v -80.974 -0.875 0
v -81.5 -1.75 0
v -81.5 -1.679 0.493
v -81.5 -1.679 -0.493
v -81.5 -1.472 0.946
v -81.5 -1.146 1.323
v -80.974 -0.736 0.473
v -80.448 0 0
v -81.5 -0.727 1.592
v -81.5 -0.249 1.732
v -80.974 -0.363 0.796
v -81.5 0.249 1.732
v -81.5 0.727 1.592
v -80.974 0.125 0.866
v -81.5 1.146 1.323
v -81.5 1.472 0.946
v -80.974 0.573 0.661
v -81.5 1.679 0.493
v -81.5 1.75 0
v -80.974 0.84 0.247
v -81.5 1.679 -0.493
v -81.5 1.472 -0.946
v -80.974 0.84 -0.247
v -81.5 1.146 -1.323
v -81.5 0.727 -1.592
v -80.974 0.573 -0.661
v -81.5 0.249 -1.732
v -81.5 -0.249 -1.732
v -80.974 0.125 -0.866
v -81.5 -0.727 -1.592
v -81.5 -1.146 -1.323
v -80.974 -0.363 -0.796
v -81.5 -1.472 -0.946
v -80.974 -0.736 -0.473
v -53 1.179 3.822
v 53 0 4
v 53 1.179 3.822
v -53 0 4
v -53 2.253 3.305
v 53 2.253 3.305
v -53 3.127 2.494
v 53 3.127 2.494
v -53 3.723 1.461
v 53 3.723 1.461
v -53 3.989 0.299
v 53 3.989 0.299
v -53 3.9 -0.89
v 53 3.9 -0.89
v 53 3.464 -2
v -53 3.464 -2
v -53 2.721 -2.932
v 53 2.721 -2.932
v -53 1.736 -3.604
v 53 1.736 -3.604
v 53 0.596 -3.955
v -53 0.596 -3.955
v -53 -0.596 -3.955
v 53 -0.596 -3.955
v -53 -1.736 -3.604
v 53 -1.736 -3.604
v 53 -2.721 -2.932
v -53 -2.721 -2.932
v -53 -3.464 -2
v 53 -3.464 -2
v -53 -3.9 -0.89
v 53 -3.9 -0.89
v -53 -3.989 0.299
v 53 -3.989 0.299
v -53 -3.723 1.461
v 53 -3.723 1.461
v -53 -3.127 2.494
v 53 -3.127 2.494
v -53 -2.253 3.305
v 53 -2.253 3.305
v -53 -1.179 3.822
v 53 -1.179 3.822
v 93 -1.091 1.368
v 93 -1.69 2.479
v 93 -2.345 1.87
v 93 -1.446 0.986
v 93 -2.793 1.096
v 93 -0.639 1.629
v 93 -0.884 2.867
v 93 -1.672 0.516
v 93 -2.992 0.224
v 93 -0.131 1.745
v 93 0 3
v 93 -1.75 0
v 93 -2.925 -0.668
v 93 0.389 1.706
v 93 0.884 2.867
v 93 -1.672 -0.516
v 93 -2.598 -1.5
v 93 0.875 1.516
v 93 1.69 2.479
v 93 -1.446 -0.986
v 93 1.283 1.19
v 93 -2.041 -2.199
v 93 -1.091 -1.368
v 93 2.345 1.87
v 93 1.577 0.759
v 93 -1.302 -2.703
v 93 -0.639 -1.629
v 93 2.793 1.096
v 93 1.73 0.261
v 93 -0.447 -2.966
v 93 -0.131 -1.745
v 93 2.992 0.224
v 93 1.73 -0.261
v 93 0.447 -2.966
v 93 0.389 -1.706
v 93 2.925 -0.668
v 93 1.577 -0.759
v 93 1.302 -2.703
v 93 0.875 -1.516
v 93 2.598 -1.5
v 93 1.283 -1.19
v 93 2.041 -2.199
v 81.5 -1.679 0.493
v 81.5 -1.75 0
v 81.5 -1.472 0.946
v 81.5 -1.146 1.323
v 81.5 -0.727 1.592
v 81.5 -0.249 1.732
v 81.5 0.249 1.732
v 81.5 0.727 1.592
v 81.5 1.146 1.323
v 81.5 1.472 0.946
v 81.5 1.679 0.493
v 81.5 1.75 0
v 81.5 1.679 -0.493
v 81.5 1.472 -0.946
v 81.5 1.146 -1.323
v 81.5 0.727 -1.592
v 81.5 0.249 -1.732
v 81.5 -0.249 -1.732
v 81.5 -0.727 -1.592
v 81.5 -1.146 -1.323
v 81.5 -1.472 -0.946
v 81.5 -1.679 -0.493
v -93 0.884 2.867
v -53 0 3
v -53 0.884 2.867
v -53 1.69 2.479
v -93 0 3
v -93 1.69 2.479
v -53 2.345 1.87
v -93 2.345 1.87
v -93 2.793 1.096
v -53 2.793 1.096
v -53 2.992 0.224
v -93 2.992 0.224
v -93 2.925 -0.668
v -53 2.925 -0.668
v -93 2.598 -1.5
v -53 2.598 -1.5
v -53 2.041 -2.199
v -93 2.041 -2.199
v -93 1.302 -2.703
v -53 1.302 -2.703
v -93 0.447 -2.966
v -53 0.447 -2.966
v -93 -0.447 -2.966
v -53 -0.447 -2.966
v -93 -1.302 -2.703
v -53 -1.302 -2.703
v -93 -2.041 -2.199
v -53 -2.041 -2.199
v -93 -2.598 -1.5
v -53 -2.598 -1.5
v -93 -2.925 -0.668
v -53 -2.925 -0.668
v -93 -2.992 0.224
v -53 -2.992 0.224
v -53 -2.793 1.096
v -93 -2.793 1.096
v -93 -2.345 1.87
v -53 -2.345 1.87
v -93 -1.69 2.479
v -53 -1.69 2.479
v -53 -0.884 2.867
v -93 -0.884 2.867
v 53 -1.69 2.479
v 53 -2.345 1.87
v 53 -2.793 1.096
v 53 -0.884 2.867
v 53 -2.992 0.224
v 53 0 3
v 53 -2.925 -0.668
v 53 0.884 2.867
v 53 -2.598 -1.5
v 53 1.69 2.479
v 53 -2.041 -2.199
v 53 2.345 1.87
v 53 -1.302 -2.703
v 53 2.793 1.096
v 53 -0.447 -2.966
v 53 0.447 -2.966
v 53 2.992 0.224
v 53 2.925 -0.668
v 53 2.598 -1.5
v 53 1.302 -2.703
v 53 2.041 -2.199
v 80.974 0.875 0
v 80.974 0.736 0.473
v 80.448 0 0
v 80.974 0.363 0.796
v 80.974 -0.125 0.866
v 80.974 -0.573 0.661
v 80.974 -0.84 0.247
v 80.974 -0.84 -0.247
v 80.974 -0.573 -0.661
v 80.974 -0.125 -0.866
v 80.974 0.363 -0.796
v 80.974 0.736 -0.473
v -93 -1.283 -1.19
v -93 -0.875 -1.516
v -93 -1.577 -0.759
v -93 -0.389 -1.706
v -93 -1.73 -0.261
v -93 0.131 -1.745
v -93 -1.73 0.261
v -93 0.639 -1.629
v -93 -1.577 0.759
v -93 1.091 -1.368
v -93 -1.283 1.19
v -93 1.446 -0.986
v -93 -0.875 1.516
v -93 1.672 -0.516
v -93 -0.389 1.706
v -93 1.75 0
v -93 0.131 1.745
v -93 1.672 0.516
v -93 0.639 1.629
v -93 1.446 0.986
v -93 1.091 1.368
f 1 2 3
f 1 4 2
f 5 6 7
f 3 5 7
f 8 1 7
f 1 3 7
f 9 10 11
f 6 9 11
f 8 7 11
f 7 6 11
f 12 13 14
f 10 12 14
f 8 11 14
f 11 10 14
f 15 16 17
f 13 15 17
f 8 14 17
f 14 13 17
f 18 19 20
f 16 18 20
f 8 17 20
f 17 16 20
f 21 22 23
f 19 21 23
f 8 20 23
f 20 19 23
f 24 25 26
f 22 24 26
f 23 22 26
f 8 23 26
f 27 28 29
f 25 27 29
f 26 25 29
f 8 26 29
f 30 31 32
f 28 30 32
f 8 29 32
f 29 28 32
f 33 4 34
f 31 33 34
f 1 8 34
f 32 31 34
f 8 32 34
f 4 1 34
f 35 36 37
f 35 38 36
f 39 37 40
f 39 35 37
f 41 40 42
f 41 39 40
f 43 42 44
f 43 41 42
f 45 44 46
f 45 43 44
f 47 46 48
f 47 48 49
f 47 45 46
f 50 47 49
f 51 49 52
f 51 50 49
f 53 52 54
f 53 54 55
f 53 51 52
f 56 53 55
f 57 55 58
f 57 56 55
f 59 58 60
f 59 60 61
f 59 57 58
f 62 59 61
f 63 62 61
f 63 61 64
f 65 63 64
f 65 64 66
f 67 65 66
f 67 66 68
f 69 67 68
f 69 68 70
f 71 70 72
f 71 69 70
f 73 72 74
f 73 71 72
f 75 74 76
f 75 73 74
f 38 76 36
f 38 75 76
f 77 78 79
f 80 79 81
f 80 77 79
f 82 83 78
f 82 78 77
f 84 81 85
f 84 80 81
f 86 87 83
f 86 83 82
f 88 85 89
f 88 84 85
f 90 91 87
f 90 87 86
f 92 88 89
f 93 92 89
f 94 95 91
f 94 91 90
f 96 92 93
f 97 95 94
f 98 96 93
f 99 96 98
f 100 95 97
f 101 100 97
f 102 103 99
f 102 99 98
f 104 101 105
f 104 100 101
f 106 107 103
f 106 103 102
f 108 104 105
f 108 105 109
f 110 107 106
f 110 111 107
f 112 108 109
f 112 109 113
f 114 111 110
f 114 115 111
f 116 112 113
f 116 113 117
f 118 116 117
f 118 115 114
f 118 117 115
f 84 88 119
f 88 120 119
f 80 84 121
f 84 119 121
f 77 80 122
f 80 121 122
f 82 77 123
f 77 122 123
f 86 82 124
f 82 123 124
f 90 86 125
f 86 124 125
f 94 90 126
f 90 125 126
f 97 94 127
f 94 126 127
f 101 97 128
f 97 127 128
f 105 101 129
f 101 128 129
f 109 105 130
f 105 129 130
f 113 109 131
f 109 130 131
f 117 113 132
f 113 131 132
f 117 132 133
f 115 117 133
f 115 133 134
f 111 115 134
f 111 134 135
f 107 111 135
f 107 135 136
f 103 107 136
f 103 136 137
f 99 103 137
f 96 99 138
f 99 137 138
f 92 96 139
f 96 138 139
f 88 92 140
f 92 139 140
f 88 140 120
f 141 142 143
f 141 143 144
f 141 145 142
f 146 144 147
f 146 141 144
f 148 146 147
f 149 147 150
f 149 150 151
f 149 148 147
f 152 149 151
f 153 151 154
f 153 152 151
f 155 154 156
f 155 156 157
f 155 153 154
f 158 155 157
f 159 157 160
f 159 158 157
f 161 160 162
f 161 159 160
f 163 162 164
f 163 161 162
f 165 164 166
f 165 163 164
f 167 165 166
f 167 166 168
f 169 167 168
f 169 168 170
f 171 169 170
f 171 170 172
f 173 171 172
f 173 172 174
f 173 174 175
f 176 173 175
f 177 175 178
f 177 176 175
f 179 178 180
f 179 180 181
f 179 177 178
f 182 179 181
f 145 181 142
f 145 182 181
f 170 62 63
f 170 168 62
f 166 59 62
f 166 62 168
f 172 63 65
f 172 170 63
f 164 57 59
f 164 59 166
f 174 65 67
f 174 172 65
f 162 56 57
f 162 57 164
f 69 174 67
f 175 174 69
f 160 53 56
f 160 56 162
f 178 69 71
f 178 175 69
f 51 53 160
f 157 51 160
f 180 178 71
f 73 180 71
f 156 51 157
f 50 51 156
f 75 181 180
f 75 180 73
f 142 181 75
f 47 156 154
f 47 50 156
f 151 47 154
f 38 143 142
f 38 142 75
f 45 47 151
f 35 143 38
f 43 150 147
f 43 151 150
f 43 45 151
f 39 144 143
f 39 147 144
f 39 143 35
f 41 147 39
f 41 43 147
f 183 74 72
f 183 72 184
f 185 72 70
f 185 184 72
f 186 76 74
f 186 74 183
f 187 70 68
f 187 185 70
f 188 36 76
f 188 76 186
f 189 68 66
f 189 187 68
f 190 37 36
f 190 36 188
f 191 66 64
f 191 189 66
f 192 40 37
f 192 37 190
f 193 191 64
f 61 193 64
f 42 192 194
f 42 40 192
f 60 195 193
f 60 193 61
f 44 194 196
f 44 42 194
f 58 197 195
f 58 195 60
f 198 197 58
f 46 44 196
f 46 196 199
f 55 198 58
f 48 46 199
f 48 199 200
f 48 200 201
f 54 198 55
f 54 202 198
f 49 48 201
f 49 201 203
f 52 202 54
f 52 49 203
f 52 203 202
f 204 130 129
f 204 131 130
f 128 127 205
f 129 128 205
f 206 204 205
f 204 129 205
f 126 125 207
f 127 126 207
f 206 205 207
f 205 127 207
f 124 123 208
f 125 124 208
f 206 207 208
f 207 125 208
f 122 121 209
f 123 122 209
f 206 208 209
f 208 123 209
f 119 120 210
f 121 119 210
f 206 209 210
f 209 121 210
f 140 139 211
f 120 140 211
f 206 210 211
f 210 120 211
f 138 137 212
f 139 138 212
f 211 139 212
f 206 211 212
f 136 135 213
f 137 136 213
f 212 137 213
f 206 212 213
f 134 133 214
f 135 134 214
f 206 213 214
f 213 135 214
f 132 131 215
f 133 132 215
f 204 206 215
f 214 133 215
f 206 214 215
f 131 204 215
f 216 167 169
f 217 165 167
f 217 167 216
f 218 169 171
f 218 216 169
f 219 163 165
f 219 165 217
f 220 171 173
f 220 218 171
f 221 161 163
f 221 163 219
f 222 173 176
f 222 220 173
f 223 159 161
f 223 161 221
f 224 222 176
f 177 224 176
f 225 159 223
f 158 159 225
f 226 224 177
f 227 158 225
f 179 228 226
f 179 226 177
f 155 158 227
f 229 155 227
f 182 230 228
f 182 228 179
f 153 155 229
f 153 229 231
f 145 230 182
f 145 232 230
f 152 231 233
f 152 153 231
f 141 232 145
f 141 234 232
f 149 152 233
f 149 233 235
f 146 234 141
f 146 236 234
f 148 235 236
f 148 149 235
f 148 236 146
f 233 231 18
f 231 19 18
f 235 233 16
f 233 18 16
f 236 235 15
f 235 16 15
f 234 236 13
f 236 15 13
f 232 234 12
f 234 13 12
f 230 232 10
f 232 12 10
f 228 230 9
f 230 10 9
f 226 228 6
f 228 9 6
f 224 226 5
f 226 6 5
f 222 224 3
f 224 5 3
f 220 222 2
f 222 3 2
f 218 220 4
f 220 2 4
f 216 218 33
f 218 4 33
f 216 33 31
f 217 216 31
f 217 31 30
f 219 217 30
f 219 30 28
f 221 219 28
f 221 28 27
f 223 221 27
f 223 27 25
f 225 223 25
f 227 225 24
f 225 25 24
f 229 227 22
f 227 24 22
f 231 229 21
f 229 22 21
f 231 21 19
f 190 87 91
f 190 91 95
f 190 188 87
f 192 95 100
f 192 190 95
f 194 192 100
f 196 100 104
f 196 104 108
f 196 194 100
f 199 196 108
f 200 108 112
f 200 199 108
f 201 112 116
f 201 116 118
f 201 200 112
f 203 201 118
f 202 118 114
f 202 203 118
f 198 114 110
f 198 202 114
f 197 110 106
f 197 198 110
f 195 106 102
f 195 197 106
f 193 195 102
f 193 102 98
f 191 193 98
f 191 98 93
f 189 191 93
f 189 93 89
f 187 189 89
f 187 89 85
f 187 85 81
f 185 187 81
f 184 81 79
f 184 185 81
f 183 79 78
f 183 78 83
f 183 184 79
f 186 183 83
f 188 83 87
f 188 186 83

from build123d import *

# Parameters (mm, degrees)
F4_D           = 3.5
F4_DEPTH       = 11.5
F4_TIP         = 1.0515060833
F4_ON_F2_D     = 3.5
F4_ON_F2_DEPTH = 11.5
F4_ON_F2_TIP   = 1.0515060833


with BuildPart() as f1:
    # F0 (on Front) → F1 (revolve)
    with BuildSketch(Plane.XZ):
        Polygon((53, 4), (43, 4), (-43, 4), (-53, 4), (-53, 3), (-93, 3), (-93, 0), (93, 0), (93, 3), (53, 3), align=None)
    revolve(axis=Axis((0, 0, 0), (-1, 0, 0)))

    # F4
    with Locations(Plane.YZ.offset(93)):
        with Locations((0, 0)):
            Hole(F4_D / 2, depth=F4_DEPTH)
            with Locations((0, 0, -(F4_DEPTH + F4_TIP / 2))):  # 118° drill point
                Cone(0, F4_D / 2, F4_TIP, mode=Mode.SUBTRACT)

    # F4 on F2
    with Locations(Plane(origin=(-93, 0, 0), x_dir=(0, -1, 0), z_dir=(-1, 0, 0))):
        with Locations((0, 0)):
            Hole(F4_ON_F2_D / 2, depth=F4_ON_F2_DEPTH)
            with Locations((0, 0, -(F4_ON_F2_DEPTH + F4_ON_F2_TIP / 2))):  # 118° drill point
                Cone(0, F4_ON_F2_D / 2, F4_ON_F2_TIP, mode=Mode.SUBTRACT)


solid = f1.part
